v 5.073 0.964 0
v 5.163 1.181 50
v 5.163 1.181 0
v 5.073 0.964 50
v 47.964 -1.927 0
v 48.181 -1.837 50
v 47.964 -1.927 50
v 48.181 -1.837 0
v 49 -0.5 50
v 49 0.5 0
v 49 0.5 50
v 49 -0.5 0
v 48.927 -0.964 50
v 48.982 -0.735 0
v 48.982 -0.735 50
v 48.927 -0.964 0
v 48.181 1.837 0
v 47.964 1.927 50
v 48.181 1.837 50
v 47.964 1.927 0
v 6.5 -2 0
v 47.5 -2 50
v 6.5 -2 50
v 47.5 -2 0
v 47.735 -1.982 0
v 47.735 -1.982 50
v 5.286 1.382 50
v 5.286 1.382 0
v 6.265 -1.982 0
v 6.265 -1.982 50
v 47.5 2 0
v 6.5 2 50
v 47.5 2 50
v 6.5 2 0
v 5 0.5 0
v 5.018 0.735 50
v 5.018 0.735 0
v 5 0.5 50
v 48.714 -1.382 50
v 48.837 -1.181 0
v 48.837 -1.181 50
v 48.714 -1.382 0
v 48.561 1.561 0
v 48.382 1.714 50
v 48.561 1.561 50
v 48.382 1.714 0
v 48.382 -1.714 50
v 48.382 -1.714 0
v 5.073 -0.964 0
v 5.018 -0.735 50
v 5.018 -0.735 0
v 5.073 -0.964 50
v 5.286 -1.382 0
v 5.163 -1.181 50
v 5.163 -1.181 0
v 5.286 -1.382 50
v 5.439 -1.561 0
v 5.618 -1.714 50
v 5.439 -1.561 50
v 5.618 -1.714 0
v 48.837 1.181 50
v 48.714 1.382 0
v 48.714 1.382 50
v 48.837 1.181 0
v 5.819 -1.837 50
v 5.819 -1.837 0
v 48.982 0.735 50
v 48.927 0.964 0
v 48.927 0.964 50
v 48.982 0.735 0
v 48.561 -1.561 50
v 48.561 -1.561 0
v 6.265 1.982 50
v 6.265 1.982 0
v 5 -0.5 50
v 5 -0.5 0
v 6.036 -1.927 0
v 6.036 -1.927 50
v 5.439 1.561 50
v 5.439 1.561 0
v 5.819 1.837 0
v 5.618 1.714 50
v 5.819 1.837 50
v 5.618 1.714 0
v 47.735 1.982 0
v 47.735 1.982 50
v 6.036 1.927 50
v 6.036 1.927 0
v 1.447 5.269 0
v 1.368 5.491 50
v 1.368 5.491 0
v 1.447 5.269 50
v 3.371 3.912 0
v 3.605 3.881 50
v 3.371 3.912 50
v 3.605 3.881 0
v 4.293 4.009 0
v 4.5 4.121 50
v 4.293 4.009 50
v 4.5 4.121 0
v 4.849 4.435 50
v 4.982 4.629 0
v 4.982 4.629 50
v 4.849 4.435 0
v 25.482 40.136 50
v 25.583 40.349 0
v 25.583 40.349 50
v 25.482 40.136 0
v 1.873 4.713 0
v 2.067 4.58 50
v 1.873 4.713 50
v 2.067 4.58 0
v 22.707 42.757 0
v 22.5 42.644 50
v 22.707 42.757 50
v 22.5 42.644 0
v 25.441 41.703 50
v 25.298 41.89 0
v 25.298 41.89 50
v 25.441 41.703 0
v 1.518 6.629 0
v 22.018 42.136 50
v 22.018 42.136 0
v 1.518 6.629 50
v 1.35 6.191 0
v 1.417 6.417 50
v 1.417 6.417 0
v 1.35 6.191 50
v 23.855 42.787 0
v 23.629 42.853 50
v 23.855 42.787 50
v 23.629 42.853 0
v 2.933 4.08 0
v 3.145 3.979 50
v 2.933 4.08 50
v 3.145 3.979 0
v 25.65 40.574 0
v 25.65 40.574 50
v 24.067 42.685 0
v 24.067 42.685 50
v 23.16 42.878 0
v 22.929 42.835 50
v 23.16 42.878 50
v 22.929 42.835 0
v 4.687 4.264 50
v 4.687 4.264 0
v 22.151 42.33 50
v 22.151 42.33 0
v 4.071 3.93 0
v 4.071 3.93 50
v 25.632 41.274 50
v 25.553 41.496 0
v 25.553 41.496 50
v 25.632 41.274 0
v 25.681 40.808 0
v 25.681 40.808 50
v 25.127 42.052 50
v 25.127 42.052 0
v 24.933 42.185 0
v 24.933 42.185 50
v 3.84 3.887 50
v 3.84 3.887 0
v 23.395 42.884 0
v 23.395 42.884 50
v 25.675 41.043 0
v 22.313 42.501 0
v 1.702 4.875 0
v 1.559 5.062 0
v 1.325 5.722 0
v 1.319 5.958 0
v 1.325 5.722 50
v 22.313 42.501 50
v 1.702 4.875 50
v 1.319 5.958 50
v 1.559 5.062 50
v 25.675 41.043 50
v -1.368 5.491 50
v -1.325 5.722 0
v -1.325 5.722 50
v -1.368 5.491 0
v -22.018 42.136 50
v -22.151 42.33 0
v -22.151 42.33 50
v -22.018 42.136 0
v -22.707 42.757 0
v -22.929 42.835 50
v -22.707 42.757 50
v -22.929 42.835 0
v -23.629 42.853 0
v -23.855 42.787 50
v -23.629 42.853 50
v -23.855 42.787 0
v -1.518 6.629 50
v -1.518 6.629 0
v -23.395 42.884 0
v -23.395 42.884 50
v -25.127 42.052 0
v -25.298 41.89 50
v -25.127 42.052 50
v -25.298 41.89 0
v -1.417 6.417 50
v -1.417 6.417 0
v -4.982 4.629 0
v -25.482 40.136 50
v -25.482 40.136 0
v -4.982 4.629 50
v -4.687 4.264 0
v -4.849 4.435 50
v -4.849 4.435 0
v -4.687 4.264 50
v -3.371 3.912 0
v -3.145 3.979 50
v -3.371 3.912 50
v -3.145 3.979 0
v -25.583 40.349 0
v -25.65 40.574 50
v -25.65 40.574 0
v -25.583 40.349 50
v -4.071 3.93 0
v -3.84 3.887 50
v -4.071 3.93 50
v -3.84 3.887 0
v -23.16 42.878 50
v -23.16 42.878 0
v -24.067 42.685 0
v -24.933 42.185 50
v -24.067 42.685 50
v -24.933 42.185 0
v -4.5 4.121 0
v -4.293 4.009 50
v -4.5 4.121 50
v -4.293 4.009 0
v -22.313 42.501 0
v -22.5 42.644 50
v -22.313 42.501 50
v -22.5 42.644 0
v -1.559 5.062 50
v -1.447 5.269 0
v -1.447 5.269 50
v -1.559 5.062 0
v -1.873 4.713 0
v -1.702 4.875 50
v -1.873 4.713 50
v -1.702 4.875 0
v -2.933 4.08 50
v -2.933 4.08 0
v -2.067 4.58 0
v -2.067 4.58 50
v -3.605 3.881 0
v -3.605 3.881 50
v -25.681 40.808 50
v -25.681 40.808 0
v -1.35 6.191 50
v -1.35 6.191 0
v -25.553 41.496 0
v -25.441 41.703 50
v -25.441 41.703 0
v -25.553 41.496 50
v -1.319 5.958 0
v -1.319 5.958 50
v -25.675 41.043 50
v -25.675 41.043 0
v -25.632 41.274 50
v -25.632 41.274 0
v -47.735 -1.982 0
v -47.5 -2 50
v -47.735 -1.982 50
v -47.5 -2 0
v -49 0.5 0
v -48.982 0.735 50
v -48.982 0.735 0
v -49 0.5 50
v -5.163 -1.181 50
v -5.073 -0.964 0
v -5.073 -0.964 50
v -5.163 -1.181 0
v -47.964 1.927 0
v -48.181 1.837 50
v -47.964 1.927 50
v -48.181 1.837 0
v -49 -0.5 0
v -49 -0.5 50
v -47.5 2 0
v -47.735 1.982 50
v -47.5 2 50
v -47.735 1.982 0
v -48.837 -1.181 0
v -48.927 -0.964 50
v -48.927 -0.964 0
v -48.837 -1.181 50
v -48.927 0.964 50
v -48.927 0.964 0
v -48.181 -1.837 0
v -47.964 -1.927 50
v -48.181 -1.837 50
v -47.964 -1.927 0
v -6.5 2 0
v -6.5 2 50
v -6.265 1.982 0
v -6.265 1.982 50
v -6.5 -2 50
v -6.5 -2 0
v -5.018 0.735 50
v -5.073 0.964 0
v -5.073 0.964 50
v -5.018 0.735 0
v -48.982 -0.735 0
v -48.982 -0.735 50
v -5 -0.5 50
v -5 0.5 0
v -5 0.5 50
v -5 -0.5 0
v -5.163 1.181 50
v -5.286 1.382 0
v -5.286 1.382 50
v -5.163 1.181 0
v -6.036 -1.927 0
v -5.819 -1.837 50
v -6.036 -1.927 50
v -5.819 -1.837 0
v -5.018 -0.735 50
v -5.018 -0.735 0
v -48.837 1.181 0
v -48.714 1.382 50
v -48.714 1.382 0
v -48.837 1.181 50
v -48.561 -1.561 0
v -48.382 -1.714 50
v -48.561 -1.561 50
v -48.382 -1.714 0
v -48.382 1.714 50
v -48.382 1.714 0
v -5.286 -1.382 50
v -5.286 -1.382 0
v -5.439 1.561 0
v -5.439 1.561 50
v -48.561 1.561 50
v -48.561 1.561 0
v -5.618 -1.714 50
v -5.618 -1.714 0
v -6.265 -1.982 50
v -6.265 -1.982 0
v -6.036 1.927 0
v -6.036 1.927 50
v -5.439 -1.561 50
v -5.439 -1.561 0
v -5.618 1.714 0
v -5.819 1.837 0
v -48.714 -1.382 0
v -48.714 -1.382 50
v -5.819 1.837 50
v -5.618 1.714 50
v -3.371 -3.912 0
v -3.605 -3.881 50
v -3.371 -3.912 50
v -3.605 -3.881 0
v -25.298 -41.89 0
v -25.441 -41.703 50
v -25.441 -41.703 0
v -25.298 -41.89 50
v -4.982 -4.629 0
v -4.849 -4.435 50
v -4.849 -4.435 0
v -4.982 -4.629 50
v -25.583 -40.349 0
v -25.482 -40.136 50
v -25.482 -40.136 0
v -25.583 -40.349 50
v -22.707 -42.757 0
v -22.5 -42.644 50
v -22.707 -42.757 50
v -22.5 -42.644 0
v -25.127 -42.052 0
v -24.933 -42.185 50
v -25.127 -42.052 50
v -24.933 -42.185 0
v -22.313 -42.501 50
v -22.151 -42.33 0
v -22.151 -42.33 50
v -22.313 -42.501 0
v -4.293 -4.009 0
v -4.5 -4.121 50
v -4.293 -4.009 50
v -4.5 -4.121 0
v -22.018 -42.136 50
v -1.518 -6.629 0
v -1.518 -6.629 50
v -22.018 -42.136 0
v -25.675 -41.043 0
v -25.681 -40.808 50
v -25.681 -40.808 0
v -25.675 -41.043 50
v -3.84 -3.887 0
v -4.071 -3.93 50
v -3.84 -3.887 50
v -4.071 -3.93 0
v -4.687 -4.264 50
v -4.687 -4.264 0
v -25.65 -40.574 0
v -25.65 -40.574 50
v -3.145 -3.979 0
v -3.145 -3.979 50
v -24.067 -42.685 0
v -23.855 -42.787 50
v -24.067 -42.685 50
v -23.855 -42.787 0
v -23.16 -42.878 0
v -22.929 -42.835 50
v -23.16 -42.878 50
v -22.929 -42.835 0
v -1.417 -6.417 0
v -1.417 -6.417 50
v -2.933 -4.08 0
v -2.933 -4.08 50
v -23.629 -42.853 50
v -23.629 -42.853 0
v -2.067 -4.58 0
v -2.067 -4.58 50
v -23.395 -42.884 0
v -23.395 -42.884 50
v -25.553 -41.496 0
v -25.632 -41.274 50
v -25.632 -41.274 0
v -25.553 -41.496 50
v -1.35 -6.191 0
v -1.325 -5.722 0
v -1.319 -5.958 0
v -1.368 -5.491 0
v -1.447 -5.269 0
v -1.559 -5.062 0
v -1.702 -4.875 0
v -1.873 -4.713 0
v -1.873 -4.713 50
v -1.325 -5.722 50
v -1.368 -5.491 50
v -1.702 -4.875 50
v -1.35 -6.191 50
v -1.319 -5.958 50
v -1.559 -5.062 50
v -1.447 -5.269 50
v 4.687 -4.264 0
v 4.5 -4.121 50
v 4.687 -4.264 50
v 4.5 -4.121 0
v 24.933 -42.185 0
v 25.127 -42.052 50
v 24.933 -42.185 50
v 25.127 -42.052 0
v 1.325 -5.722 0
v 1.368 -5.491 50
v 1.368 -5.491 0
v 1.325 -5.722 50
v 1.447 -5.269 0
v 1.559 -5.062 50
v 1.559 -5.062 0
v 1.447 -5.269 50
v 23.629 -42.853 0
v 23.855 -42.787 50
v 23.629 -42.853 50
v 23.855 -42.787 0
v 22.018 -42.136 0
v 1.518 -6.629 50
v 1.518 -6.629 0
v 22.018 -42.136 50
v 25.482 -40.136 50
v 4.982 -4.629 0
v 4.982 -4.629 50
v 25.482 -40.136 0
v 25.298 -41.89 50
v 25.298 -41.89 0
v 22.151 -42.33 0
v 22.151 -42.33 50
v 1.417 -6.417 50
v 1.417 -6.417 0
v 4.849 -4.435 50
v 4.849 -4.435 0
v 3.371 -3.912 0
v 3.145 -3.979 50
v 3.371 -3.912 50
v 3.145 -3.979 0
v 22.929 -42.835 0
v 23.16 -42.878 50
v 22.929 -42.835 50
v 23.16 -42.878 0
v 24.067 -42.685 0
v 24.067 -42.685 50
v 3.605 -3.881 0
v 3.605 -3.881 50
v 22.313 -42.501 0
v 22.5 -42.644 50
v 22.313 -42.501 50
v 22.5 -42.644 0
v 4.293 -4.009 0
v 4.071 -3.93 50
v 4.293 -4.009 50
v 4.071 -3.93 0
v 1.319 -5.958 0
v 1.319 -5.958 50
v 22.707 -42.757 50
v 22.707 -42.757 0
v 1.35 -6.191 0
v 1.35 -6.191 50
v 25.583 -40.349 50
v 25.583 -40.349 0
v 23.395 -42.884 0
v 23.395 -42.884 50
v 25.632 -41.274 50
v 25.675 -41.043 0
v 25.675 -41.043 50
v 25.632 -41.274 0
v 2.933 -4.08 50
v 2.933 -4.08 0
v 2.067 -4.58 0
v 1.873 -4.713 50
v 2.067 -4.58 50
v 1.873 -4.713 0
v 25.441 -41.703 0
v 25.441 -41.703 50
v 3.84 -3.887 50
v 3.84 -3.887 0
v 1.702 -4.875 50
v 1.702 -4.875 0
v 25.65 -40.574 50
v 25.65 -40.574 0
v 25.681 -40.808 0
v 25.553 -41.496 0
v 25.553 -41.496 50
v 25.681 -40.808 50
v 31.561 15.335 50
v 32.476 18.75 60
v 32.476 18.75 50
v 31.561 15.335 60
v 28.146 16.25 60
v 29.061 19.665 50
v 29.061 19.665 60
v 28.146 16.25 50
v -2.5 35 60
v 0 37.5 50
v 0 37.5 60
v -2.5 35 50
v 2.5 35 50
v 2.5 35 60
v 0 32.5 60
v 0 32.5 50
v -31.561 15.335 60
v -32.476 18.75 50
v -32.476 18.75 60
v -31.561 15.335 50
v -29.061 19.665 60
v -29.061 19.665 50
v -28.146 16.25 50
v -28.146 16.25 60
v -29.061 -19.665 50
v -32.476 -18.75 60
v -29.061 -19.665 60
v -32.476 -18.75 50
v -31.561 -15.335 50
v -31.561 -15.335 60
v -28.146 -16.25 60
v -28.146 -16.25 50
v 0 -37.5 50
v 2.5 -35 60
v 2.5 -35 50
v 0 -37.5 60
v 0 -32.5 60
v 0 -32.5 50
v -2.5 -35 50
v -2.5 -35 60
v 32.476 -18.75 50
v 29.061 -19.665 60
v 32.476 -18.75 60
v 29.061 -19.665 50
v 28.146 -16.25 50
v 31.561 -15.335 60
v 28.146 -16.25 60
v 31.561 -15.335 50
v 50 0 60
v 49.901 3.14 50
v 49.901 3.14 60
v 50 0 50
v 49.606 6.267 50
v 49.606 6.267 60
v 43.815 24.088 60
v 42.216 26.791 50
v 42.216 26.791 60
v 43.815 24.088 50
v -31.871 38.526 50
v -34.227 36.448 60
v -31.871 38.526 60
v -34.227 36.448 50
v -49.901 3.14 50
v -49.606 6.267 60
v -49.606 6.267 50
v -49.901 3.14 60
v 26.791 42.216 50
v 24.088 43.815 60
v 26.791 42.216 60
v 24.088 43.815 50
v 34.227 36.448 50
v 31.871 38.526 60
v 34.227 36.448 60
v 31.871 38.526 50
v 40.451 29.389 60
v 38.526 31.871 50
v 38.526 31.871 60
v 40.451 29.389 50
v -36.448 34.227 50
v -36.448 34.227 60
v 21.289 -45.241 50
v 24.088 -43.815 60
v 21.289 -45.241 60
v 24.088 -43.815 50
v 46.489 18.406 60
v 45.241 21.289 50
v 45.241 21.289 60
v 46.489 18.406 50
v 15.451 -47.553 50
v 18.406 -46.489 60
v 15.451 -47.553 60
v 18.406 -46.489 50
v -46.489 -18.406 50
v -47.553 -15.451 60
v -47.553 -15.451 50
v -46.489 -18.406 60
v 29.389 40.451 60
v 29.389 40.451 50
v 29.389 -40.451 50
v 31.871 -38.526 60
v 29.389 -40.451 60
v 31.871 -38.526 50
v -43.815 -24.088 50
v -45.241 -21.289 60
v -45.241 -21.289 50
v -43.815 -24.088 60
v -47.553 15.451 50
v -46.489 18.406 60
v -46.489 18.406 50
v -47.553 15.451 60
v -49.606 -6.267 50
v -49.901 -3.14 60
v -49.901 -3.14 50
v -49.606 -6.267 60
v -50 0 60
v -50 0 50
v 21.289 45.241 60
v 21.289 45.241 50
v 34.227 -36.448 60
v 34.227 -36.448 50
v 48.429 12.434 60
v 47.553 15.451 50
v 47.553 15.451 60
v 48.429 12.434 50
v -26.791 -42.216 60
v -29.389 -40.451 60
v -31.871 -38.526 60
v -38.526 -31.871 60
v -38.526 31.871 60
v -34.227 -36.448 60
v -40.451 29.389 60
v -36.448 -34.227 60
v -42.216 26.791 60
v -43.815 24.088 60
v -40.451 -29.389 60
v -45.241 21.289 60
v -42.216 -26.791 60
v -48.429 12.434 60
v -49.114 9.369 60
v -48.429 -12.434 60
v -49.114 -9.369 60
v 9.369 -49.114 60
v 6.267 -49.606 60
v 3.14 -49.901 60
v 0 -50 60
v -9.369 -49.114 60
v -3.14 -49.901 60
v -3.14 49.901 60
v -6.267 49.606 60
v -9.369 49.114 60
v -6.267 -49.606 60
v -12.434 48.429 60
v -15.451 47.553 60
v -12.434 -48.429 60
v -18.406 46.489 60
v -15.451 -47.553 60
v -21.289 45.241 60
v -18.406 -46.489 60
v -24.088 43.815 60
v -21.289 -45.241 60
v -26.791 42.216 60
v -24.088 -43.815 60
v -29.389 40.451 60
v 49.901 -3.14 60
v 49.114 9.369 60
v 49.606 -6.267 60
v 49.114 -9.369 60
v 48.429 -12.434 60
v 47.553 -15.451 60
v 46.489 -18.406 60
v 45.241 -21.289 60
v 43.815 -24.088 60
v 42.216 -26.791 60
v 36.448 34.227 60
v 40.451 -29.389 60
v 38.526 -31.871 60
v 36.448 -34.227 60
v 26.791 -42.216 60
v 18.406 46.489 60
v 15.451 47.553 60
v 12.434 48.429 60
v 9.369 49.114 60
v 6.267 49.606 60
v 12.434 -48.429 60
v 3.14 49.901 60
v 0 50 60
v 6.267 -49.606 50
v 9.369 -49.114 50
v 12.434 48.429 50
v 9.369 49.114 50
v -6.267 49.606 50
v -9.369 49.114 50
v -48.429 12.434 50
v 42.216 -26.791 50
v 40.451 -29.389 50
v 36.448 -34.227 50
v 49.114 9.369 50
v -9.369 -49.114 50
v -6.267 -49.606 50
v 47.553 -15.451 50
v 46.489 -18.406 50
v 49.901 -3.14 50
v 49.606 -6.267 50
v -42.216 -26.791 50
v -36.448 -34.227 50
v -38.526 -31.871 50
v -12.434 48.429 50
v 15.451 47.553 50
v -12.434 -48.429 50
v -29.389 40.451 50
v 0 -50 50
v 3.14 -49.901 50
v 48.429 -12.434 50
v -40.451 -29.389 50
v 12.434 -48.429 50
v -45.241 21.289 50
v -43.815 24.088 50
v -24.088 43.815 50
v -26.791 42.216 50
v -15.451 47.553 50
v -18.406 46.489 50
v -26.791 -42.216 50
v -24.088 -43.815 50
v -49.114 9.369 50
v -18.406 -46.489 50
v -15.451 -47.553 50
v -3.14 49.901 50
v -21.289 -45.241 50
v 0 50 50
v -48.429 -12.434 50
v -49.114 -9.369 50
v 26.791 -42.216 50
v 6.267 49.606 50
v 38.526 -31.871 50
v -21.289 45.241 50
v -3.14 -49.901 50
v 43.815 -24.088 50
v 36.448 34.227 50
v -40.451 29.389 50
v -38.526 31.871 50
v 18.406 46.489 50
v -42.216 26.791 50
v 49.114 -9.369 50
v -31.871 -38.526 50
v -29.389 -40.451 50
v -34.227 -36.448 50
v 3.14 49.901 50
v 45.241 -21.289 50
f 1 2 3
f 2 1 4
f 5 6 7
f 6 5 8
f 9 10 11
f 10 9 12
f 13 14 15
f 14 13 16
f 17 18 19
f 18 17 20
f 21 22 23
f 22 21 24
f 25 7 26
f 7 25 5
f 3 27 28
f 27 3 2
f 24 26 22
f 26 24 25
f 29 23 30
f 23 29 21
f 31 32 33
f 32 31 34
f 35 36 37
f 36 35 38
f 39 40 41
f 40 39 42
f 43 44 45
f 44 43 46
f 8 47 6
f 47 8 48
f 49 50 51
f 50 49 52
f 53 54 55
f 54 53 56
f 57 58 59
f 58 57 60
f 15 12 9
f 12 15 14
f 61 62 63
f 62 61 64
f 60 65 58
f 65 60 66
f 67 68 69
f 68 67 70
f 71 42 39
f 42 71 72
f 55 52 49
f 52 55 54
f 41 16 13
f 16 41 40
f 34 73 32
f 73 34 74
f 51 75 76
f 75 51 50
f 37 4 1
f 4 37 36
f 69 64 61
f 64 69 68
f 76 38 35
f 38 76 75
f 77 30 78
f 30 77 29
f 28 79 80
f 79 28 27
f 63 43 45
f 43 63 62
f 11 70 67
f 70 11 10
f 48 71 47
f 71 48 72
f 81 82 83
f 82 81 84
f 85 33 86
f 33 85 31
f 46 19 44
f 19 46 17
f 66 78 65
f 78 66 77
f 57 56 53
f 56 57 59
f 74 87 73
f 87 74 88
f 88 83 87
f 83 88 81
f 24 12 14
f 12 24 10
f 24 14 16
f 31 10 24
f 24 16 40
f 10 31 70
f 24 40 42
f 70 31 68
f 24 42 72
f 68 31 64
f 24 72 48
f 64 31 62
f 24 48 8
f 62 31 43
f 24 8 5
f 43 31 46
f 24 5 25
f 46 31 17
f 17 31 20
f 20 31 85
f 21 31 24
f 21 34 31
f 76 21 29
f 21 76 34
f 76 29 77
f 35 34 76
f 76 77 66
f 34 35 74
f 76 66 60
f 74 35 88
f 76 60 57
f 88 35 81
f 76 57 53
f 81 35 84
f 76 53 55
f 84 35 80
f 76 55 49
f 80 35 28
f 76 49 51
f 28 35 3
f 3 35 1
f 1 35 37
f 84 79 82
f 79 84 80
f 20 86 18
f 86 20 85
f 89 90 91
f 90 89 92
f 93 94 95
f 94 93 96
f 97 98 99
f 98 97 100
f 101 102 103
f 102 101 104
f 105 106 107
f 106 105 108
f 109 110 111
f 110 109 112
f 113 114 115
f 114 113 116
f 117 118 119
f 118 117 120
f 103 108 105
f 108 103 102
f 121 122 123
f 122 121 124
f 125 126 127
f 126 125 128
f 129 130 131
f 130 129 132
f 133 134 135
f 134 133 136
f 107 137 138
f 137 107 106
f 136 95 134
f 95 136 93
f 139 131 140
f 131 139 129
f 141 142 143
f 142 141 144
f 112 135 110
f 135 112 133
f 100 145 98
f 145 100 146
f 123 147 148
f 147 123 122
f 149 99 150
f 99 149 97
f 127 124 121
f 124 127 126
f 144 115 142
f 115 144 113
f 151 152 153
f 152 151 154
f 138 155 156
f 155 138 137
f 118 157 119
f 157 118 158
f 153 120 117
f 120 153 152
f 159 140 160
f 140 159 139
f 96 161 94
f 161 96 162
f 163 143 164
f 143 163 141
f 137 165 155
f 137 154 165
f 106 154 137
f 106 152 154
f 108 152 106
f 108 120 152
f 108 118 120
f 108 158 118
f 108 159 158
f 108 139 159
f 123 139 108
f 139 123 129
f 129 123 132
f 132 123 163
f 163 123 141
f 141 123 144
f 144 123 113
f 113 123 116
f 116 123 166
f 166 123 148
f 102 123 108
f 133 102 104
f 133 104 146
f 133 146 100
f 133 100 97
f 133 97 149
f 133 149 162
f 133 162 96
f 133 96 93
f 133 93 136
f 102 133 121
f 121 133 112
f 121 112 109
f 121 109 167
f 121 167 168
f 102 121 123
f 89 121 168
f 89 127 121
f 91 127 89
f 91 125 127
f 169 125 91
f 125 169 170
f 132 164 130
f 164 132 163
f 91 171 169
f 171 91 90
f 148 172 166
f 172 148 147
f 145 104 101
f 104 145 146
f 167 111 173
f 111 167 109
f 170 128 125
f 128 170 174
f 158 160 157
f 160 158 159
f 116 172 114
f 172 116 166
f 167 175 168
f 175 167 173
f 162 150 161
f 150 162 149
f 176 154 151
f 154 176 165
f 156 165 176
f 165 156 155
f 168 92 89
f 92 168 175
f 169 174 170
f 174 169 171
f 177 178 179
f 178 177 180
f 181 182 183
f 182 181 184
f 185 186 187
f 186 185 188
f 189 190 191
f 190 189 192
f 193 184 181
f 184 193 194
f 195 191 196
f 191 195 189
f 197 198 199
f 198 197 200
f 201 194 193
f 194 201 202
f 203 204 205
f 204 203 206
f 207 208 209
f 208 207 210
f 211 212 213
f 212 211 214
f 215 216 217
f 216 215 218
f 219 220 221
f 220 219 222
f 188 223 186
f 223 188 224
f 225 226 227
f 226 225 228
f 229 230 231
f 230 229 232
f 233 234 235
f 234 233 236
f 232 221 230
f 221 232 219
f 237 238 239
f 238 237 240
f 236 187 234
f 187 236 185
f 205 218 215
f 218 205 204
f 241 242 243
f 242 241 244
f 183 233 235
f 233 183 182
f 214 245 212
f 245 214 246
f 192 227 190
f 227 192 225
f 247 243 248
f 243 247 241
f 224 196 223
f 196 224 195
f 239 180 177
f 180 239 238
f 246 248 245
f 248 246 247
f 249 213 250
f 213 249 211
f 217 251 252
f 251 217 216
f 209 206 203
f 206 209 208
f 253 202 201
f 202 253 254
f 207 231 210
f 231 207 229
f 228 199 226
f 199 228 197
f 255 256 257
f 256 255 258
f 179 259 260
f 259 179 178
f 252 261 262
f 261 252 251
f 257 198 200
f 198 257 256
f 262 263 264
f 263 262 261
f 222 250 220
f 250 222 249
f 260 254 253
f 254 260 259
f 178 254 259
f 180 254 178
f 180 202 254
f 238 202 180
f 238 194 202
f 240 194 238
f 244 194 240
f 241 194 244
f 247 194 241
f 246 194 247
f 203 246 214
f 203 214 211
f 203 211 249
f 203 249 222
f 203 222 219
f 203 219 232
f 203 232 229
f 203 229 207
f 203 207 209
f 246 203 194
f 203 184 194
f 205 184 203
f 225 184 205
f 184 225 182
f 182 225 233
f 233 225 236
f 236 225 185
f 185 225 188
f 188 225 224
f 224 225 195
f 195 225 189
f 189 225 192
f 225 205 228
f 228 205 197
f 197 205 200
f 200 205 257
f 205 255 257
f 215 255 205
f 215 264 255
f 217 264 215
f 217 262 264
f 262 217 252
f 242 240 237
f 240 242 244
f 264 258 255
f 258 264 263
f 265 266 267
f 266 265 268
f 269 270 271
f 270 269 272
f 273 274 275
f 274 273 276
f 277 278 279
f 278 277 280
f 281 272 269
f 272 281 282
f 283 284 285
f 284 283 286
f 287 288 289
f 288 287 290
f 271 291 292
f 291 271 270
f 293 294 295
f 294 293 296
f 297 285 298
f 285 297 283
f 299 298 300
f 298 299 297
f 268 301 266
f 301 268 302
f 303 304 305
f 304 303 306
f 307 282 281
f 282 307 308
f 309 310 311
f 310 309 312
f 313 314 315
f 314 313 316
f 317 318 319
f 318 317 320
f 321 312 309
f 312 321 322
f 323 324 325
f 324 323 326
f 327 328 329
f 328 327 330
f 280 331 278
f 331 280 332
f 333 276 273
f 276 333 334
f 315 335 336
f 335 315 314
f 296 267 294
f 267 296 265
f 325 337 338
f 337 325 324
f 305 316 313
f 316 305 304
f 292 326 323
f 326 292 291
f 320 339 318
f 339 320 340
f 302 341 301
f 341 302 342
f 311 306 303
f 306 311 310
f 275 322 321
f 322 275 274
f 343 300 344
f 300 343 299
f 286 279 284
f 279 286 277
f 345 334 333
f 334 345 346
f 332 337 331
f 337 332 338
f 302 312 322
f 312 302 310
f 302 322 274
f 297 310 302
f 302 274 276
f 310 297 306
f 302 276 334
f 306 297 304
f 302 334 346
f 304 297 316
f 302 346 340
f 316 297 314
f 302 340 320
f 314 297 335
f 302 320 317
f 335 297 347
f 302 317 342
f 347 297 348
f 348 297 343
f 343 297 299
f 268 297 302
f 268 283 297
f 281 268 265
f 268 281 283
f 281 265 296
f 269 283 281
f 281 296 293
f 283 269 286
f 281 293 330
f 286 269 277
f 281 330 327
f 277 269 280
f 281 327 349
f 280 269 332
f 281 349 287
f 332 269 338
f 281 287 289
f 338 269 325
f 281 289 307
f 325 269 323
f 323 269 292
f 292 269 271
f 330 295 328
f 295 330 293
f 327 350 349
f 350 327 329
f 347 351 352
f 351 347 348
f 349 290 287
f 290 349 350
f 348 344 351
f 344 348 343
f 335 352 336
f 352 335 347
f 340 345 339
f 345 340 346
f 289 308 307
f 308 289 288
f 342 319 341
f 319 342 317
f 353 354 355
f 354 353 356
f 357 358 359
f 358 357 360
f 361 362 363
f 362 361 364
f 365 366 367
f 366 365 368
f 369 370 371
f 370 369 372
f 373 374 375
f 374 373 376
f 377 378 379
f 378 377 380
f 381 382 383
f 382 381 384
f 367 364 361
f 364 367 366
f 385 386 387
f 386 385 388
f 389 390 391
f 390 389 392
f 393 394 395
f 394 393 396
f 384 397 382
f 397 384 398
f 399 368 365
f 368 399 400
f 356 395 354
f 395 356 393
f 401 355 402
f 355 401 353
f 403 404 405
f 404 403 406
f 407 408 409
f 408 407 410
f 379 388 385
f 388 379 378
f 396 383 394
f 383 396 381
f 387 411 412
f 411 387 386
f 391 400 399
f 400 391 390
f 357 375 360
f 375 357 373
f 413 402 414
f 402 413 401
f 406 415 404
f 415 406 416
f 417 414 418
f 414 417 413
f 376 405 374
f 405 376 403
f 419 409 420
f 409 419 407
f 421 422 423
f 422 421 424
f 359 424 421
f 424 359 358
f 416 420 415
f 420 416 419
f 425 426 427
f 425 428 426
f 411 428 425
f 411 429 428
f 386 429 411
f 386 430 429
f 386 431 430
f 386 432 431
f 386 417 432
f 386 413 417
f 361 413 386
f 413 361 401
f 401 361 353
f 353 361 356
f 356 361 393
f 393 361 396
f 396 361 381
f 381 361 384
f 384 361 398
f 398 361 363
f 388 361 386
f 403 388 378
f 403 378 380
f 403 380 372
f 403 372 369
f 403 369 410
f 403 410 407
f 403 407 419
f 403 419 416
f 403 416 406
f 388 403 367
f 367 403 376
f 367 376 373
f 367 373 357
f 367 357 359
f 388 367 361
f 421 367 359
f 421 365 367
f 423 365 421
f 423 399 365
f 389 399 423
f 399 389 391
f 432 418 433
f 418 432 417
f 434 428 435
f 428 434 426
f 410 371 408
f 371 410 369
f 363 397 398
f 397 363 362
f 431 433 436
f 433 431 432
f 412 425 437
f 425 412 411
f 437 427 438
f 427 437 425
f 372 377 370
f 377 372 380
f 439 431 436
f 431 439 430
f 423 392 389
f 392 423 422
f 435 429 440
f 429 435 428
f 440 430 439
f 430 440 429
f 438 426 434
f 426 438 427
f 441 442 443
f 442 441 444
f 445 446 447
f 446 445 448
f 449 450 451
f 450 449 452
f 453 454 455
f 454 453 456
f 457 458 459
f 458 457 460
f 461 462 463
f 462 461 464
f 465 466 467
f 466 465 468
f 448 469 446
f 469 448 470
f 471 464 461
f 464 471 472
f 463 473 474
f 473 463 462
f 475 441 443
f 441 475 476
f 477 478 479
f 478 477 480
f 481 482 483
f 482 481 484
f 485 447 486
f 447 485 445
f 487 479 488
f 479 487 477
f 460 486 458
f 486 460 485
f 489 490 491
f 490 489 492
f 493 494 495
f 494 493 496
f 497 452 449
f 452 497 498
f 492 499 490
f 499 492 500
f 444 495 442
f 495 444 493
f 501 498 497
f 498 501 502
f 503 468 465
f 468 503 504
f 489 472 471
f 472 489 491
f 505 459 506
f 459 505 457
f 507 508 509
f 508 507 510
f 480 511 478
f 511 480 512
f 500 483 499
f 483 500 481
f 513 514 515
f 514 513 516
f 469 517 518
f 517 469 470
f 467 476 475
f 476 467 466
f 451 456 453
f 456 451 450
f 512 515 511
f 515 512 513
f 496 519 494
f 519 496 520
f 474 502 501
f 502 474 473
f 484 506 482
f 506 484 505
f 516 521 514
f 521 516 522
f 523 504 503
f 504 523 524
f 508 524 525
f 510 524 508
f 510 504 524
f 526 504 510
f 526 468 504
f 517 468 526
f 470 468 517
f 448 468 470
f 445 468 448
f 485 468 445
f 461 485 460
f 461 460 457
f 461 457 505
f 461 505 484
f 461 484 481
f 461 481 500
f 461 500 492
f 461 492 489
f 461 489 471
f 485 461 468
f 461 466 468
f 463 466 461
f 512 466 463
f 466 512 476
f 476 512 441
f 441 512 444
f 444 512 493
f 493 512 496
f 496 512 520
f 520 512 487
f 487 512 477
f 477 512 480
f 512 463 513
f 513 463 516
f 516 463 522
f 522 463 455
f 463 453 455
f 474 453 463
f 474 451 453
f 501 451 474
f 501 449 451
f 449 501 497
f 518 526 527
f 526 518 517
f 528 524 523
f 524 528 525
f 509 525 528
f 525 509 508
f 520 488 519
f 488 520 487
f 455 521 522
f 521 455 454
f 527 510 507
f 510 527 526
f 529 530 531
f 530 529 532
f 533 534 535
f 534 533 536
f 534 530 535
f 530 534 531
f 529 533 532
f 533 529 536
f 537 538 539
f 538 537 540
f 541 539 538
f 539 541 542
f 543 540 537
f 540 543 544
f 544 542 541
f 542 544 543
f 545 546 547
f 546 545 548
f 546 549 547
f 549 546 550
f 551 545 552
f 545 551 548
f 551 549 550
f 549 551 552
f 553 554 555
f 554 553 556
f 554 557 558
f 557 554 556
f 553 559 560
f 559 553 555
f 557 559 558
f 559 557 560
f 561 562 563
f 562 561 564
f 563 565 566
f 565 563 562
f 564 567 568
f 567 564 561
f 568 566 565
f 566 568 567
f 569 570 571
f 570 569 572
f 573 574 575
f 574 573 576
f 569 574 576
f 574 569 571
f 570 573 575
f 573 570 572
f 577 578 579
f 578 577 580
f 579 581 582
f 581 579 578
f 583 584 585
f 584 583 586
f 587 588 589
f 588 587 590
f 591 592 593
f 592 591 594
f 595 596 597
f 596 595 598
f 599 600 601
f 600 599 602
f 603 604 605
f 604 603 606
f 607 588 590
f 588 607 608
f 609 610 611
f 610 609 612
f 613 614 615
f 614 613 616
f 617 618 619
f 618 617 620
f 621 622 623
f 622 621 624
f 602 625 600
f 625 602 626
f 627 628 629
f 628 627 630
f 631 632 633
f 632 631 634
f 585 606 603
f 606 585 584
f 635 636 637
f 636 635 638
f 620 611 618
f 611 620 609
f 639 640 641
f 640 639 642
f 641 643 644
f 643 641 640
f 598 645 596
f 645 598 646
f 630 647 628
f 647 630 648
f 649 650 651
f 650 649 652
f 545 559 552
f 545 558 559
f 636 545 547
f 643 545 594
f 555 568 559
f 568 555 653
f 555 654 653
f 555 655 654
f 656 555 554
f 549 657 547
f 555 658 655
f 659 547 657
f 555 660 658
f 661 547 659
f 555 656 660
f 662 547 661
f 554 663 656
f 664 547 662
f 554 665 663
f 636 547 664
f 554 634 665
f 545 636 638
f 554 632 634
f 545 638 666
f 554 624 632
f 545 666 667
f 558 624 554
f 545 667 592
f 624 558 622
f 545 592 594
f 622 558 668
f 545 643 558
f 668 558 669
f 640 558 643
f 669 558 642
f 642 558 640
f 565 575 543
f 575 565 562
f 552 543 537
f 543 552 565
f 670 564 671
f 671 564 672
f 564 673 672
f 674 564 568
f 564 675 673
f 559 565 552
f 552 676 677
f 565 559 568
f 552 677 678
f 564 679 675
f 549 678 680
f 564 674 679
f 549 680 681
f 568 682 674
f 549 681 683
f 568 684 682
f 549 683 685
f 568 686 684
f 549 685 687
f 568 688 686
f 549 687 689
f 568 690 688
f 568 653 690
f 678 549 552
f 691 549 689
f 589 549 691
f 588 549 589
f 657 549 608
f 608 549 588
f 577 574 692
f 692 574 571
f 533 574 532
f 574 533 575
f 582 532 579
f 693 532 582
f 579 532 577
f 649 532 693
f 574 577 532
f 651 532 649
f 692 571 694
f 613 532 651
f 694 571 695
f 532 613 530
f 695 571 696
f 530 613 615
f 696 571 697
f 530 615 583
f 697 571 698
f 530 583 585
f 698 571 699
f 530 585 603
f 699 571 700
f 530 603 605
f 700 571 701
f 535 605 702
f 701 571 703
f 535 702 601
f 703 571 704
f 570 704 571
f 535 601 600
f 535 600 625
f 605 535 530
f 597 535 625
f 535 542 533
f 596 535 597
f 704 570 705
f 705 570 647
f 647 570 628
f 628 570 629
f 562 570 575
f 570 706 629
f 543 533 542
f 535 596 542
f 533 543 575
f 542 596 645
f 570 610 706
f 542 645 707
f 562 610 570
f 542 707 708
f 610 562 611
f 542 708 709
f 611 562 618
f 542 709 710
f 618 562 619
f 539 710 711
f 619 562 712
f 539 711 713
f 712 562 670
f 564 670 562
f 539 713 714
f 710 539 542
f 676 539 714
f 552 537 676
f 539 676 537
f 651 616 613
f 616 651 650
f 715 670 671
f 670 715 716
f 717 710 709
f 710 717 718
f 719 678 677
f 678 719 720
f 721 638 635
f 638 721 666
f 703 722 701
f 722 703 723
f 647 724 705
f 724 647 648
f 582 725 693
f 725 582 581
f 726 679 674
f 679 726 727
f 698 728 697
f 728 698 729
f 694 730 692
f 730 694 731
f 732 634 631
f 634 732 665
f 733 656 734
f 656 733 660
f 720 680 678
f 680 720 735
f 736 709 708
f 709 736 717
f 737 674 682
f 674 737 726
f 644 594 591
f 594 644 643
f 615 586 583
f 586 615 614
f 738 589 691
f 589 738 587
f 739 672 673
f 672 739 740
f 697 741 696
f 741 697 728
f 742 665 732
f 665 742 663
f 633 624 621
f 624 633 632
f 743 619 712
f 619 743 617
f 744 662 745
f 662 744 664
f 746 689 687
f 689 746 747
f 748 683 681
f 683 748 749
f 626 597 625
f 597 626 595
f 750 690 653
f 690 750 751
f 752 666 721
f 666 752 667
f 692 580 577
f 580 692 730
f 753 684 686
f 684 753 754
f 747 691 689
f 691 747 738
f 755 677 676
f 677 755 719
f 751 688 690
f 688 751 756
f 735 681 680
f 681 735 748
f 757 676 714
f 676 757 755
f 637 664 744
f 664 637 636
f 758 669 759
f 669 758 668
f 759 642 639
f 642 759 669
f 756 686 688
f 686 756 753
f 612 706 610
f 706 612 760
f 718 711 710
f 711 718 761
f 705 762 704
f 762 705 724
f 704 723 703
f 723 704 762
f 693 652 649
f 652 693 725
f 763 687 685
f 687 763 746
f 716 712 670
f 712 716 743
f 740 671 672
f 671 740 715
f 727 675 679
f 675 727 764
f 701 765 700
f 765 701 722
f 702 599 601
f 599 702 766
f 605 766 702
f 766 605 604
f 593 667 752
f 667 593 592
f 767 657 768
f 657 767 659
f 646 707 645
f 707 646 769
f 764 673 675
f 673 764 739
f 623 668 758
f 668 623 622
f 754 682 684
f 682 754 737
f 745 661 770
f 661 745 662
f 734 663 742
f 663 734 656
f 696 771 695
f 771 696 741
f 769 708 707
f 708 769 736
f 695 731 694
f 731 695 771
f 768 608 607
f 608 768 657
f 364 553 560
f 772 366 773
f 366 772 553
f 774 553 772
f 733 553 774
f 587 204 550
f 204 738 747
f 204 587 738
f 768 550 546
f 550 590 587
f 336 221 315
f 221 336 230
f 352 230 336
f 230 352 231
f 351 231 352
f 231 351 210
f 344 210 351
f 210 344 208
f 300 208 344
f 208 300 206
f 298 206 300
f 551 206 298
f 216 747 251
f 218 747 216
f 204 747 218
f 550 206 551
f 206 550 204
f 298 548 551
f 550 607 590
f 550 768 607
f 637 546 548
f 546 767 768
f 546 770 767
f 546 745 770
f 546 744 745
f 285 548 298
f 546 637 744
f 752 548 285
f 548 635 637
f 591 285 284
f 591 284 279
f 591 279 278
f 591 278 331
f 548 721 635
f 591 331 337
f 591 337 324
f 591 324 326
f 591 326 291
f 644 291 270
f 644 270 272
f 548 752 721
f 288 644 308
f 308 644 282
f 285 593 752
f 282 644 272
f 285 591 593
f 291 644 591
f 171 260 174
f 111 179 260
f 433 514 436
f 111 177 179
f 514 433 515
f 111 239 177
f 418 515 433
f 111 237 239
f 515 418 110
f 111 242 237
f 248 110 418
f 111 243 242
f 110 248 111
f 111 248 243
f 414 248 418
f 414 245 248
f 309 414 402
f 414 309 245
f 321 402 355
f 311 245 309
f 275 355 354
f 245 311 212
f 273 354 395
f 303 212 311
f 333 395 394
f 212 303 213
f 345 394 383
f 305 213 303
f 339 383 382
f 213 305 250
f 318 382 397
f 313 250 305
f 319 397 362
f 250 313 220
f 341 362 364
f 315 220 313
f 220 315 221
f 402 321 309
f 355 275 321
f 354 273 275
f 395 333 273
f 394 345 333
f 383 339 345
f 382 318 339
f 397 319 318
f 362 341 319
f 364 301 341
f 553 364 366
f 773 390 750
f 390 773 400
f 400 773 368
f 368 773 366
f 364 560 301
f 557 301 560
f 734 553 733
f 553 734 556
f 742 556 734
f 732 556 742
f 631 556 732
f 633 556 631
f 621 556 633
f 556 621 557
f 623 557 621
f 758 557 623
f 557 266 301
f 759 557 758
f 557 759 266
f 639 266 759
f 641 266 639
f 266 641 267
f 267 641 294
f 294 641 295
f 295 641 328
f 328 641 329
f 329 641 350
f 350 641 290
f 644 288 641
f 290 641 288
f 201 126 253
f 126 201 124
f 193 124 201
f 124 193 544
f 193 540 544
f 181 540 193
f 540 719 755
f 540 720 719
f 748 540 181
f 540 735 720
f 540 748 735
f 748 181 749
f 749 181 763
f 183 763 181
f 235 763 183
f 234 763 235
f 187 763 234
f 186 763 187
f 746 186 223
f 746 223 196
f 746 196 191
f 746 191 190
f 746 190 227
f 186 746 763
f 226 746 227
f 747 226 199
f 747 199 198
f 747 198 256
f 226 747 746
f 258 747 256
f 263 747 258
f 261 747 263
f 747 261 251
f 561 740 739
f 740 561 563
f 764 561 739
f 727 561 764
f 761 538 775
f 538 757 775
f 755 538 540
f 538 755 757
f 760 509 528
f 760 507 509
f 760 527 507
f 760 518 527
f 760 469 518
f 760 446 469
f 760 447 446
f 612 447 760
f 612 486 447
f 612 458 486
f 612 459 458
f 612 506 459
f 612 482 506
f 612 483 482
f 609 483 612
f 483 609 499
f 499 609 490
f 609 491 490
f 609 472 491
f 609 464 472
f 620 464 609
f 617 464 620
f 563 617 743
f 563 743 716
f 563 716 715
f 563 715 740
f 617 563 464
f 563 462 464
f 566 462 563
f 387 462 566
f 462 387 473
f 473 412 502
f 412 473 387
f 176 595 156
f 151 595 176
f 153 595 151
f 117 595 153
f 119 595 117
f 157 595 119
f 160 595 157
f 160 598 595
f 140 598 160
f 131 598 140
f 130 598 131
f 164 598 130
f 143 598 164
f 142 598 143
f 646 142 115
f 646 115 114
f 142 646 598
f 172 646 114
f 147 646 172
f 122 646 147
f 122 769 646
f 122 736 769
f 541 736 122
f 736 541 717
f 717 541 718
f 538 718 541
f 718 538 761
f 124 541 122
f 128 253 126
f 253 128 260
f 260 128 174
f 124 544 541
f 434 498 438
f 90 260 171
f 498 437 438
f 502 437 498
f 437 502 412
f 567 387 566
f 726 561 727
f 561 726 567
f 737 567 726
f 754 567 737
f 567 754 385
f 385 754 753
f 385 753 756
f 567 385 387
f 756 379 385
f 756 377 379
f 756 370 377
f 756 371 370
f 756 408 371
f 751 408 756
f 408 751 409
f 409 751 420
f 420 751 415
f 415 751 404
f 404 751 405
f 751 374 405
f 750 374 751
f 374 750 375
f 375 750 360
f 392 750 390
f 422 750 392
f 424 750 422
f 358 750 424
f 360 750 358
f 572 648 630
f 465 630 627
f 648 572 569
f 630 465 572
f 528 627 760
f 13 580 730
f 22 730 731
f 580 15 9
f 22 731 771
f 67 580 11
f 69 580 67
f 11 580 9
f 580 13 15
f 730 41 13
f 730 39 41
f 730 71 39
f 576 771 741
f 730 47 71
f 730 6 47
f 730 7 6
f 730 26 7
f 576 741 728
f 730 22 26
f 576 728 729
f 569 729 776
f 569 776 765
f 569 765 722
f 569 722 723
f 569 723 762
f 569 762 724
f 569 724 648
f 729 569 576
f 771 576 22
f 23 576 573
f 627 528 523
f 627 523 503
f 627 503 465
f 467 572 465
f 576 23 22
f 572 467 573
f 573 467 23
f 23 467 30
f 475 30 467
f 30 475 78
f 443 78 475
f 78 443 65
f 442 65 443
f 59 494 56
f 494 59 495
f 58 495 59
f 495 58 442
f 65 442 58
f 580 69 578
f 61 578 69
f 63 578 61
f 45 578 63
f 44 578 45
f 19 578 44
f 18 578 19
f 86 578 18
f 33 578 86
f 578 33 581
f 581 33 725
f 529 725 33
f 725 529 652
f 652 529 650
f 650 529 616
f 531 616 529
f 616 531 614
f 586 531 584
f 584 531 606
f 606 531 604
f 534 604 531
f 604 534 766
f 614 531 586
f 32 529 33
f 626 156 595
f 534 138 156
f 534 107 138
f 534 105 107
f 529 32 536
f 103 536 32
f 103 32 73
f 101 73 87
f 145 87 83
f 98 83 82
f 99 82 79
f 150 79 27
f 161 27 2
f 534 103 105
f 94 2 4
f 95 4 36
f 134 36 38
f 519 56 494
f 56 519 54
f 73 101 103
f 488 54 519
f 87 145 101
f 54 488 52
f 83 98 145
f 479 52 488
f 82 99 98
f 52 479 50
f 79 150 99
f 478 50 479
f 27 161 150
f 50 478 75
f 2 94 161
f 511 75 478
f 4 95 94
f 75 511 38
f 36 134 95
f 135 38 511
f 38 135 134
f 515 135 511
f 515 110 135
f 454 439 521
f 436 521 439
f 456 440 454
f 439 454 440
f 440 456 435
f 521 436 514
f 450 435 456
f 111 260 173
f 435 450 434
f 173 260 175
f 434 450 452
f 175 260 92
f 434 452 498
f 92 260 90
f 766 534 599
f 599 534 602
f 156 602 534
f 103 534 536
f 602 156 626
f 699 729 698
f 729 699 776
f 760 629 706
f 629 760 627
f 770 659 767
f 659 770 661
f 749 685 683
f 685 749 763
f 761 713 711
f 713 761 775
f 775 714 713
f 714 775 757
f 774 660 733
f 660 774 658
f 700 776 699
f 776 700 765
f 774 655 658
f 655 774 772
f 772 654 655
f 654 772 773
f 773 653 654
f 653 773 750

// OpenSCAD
height_mm = 50;
cap_height_mm = 10;
vanes = 6;
diameter_mm = 100;
centre_space_mm = 10;
tolerance_mm = 1;
vane_rounding_mm = 3;
cap_attach_points = 6;
attach_point_size = 5;

vane_length_mm = (diameter_mm - centre_space_mm) / 2;

vane_length_base_rectangle_mm = vane_length_mm - vane_rounding_mm - tolerance_mm;

color("green")
for (i = [0 : vanes - 1])
{
  rotate([0, 0, i * 360 / vanes])
  translate([vane_length_base_rectangle_mm / 2 - vane_rounding_mm / 2 + centre_space_mm / 2 + vane_rounding_mm, 0, height_mm / 2])
  minkowski()
  {
    cube([vane_length_base_rectangle_mm, 1, height_mm], center = true);
    cylinder(h = 1, d = vane_rounding_mm, $fn = 40);
  }
}

difference()
{
  translate([0, 0, height_mm])
  cylinder(cap_height_mm, d = 100, $fn = 100);
  
  for (i = [0 : cap_attach_points - 1])
  {
    rotate([0, 0, i * 360 / cap_attach_points + 30])
    translate([diameter_mm * 0.35, 0, height_mm - 10])
    cylinder(cap_height_mm + 20, d = attach_point_size, $fn = 4);
  }
}
